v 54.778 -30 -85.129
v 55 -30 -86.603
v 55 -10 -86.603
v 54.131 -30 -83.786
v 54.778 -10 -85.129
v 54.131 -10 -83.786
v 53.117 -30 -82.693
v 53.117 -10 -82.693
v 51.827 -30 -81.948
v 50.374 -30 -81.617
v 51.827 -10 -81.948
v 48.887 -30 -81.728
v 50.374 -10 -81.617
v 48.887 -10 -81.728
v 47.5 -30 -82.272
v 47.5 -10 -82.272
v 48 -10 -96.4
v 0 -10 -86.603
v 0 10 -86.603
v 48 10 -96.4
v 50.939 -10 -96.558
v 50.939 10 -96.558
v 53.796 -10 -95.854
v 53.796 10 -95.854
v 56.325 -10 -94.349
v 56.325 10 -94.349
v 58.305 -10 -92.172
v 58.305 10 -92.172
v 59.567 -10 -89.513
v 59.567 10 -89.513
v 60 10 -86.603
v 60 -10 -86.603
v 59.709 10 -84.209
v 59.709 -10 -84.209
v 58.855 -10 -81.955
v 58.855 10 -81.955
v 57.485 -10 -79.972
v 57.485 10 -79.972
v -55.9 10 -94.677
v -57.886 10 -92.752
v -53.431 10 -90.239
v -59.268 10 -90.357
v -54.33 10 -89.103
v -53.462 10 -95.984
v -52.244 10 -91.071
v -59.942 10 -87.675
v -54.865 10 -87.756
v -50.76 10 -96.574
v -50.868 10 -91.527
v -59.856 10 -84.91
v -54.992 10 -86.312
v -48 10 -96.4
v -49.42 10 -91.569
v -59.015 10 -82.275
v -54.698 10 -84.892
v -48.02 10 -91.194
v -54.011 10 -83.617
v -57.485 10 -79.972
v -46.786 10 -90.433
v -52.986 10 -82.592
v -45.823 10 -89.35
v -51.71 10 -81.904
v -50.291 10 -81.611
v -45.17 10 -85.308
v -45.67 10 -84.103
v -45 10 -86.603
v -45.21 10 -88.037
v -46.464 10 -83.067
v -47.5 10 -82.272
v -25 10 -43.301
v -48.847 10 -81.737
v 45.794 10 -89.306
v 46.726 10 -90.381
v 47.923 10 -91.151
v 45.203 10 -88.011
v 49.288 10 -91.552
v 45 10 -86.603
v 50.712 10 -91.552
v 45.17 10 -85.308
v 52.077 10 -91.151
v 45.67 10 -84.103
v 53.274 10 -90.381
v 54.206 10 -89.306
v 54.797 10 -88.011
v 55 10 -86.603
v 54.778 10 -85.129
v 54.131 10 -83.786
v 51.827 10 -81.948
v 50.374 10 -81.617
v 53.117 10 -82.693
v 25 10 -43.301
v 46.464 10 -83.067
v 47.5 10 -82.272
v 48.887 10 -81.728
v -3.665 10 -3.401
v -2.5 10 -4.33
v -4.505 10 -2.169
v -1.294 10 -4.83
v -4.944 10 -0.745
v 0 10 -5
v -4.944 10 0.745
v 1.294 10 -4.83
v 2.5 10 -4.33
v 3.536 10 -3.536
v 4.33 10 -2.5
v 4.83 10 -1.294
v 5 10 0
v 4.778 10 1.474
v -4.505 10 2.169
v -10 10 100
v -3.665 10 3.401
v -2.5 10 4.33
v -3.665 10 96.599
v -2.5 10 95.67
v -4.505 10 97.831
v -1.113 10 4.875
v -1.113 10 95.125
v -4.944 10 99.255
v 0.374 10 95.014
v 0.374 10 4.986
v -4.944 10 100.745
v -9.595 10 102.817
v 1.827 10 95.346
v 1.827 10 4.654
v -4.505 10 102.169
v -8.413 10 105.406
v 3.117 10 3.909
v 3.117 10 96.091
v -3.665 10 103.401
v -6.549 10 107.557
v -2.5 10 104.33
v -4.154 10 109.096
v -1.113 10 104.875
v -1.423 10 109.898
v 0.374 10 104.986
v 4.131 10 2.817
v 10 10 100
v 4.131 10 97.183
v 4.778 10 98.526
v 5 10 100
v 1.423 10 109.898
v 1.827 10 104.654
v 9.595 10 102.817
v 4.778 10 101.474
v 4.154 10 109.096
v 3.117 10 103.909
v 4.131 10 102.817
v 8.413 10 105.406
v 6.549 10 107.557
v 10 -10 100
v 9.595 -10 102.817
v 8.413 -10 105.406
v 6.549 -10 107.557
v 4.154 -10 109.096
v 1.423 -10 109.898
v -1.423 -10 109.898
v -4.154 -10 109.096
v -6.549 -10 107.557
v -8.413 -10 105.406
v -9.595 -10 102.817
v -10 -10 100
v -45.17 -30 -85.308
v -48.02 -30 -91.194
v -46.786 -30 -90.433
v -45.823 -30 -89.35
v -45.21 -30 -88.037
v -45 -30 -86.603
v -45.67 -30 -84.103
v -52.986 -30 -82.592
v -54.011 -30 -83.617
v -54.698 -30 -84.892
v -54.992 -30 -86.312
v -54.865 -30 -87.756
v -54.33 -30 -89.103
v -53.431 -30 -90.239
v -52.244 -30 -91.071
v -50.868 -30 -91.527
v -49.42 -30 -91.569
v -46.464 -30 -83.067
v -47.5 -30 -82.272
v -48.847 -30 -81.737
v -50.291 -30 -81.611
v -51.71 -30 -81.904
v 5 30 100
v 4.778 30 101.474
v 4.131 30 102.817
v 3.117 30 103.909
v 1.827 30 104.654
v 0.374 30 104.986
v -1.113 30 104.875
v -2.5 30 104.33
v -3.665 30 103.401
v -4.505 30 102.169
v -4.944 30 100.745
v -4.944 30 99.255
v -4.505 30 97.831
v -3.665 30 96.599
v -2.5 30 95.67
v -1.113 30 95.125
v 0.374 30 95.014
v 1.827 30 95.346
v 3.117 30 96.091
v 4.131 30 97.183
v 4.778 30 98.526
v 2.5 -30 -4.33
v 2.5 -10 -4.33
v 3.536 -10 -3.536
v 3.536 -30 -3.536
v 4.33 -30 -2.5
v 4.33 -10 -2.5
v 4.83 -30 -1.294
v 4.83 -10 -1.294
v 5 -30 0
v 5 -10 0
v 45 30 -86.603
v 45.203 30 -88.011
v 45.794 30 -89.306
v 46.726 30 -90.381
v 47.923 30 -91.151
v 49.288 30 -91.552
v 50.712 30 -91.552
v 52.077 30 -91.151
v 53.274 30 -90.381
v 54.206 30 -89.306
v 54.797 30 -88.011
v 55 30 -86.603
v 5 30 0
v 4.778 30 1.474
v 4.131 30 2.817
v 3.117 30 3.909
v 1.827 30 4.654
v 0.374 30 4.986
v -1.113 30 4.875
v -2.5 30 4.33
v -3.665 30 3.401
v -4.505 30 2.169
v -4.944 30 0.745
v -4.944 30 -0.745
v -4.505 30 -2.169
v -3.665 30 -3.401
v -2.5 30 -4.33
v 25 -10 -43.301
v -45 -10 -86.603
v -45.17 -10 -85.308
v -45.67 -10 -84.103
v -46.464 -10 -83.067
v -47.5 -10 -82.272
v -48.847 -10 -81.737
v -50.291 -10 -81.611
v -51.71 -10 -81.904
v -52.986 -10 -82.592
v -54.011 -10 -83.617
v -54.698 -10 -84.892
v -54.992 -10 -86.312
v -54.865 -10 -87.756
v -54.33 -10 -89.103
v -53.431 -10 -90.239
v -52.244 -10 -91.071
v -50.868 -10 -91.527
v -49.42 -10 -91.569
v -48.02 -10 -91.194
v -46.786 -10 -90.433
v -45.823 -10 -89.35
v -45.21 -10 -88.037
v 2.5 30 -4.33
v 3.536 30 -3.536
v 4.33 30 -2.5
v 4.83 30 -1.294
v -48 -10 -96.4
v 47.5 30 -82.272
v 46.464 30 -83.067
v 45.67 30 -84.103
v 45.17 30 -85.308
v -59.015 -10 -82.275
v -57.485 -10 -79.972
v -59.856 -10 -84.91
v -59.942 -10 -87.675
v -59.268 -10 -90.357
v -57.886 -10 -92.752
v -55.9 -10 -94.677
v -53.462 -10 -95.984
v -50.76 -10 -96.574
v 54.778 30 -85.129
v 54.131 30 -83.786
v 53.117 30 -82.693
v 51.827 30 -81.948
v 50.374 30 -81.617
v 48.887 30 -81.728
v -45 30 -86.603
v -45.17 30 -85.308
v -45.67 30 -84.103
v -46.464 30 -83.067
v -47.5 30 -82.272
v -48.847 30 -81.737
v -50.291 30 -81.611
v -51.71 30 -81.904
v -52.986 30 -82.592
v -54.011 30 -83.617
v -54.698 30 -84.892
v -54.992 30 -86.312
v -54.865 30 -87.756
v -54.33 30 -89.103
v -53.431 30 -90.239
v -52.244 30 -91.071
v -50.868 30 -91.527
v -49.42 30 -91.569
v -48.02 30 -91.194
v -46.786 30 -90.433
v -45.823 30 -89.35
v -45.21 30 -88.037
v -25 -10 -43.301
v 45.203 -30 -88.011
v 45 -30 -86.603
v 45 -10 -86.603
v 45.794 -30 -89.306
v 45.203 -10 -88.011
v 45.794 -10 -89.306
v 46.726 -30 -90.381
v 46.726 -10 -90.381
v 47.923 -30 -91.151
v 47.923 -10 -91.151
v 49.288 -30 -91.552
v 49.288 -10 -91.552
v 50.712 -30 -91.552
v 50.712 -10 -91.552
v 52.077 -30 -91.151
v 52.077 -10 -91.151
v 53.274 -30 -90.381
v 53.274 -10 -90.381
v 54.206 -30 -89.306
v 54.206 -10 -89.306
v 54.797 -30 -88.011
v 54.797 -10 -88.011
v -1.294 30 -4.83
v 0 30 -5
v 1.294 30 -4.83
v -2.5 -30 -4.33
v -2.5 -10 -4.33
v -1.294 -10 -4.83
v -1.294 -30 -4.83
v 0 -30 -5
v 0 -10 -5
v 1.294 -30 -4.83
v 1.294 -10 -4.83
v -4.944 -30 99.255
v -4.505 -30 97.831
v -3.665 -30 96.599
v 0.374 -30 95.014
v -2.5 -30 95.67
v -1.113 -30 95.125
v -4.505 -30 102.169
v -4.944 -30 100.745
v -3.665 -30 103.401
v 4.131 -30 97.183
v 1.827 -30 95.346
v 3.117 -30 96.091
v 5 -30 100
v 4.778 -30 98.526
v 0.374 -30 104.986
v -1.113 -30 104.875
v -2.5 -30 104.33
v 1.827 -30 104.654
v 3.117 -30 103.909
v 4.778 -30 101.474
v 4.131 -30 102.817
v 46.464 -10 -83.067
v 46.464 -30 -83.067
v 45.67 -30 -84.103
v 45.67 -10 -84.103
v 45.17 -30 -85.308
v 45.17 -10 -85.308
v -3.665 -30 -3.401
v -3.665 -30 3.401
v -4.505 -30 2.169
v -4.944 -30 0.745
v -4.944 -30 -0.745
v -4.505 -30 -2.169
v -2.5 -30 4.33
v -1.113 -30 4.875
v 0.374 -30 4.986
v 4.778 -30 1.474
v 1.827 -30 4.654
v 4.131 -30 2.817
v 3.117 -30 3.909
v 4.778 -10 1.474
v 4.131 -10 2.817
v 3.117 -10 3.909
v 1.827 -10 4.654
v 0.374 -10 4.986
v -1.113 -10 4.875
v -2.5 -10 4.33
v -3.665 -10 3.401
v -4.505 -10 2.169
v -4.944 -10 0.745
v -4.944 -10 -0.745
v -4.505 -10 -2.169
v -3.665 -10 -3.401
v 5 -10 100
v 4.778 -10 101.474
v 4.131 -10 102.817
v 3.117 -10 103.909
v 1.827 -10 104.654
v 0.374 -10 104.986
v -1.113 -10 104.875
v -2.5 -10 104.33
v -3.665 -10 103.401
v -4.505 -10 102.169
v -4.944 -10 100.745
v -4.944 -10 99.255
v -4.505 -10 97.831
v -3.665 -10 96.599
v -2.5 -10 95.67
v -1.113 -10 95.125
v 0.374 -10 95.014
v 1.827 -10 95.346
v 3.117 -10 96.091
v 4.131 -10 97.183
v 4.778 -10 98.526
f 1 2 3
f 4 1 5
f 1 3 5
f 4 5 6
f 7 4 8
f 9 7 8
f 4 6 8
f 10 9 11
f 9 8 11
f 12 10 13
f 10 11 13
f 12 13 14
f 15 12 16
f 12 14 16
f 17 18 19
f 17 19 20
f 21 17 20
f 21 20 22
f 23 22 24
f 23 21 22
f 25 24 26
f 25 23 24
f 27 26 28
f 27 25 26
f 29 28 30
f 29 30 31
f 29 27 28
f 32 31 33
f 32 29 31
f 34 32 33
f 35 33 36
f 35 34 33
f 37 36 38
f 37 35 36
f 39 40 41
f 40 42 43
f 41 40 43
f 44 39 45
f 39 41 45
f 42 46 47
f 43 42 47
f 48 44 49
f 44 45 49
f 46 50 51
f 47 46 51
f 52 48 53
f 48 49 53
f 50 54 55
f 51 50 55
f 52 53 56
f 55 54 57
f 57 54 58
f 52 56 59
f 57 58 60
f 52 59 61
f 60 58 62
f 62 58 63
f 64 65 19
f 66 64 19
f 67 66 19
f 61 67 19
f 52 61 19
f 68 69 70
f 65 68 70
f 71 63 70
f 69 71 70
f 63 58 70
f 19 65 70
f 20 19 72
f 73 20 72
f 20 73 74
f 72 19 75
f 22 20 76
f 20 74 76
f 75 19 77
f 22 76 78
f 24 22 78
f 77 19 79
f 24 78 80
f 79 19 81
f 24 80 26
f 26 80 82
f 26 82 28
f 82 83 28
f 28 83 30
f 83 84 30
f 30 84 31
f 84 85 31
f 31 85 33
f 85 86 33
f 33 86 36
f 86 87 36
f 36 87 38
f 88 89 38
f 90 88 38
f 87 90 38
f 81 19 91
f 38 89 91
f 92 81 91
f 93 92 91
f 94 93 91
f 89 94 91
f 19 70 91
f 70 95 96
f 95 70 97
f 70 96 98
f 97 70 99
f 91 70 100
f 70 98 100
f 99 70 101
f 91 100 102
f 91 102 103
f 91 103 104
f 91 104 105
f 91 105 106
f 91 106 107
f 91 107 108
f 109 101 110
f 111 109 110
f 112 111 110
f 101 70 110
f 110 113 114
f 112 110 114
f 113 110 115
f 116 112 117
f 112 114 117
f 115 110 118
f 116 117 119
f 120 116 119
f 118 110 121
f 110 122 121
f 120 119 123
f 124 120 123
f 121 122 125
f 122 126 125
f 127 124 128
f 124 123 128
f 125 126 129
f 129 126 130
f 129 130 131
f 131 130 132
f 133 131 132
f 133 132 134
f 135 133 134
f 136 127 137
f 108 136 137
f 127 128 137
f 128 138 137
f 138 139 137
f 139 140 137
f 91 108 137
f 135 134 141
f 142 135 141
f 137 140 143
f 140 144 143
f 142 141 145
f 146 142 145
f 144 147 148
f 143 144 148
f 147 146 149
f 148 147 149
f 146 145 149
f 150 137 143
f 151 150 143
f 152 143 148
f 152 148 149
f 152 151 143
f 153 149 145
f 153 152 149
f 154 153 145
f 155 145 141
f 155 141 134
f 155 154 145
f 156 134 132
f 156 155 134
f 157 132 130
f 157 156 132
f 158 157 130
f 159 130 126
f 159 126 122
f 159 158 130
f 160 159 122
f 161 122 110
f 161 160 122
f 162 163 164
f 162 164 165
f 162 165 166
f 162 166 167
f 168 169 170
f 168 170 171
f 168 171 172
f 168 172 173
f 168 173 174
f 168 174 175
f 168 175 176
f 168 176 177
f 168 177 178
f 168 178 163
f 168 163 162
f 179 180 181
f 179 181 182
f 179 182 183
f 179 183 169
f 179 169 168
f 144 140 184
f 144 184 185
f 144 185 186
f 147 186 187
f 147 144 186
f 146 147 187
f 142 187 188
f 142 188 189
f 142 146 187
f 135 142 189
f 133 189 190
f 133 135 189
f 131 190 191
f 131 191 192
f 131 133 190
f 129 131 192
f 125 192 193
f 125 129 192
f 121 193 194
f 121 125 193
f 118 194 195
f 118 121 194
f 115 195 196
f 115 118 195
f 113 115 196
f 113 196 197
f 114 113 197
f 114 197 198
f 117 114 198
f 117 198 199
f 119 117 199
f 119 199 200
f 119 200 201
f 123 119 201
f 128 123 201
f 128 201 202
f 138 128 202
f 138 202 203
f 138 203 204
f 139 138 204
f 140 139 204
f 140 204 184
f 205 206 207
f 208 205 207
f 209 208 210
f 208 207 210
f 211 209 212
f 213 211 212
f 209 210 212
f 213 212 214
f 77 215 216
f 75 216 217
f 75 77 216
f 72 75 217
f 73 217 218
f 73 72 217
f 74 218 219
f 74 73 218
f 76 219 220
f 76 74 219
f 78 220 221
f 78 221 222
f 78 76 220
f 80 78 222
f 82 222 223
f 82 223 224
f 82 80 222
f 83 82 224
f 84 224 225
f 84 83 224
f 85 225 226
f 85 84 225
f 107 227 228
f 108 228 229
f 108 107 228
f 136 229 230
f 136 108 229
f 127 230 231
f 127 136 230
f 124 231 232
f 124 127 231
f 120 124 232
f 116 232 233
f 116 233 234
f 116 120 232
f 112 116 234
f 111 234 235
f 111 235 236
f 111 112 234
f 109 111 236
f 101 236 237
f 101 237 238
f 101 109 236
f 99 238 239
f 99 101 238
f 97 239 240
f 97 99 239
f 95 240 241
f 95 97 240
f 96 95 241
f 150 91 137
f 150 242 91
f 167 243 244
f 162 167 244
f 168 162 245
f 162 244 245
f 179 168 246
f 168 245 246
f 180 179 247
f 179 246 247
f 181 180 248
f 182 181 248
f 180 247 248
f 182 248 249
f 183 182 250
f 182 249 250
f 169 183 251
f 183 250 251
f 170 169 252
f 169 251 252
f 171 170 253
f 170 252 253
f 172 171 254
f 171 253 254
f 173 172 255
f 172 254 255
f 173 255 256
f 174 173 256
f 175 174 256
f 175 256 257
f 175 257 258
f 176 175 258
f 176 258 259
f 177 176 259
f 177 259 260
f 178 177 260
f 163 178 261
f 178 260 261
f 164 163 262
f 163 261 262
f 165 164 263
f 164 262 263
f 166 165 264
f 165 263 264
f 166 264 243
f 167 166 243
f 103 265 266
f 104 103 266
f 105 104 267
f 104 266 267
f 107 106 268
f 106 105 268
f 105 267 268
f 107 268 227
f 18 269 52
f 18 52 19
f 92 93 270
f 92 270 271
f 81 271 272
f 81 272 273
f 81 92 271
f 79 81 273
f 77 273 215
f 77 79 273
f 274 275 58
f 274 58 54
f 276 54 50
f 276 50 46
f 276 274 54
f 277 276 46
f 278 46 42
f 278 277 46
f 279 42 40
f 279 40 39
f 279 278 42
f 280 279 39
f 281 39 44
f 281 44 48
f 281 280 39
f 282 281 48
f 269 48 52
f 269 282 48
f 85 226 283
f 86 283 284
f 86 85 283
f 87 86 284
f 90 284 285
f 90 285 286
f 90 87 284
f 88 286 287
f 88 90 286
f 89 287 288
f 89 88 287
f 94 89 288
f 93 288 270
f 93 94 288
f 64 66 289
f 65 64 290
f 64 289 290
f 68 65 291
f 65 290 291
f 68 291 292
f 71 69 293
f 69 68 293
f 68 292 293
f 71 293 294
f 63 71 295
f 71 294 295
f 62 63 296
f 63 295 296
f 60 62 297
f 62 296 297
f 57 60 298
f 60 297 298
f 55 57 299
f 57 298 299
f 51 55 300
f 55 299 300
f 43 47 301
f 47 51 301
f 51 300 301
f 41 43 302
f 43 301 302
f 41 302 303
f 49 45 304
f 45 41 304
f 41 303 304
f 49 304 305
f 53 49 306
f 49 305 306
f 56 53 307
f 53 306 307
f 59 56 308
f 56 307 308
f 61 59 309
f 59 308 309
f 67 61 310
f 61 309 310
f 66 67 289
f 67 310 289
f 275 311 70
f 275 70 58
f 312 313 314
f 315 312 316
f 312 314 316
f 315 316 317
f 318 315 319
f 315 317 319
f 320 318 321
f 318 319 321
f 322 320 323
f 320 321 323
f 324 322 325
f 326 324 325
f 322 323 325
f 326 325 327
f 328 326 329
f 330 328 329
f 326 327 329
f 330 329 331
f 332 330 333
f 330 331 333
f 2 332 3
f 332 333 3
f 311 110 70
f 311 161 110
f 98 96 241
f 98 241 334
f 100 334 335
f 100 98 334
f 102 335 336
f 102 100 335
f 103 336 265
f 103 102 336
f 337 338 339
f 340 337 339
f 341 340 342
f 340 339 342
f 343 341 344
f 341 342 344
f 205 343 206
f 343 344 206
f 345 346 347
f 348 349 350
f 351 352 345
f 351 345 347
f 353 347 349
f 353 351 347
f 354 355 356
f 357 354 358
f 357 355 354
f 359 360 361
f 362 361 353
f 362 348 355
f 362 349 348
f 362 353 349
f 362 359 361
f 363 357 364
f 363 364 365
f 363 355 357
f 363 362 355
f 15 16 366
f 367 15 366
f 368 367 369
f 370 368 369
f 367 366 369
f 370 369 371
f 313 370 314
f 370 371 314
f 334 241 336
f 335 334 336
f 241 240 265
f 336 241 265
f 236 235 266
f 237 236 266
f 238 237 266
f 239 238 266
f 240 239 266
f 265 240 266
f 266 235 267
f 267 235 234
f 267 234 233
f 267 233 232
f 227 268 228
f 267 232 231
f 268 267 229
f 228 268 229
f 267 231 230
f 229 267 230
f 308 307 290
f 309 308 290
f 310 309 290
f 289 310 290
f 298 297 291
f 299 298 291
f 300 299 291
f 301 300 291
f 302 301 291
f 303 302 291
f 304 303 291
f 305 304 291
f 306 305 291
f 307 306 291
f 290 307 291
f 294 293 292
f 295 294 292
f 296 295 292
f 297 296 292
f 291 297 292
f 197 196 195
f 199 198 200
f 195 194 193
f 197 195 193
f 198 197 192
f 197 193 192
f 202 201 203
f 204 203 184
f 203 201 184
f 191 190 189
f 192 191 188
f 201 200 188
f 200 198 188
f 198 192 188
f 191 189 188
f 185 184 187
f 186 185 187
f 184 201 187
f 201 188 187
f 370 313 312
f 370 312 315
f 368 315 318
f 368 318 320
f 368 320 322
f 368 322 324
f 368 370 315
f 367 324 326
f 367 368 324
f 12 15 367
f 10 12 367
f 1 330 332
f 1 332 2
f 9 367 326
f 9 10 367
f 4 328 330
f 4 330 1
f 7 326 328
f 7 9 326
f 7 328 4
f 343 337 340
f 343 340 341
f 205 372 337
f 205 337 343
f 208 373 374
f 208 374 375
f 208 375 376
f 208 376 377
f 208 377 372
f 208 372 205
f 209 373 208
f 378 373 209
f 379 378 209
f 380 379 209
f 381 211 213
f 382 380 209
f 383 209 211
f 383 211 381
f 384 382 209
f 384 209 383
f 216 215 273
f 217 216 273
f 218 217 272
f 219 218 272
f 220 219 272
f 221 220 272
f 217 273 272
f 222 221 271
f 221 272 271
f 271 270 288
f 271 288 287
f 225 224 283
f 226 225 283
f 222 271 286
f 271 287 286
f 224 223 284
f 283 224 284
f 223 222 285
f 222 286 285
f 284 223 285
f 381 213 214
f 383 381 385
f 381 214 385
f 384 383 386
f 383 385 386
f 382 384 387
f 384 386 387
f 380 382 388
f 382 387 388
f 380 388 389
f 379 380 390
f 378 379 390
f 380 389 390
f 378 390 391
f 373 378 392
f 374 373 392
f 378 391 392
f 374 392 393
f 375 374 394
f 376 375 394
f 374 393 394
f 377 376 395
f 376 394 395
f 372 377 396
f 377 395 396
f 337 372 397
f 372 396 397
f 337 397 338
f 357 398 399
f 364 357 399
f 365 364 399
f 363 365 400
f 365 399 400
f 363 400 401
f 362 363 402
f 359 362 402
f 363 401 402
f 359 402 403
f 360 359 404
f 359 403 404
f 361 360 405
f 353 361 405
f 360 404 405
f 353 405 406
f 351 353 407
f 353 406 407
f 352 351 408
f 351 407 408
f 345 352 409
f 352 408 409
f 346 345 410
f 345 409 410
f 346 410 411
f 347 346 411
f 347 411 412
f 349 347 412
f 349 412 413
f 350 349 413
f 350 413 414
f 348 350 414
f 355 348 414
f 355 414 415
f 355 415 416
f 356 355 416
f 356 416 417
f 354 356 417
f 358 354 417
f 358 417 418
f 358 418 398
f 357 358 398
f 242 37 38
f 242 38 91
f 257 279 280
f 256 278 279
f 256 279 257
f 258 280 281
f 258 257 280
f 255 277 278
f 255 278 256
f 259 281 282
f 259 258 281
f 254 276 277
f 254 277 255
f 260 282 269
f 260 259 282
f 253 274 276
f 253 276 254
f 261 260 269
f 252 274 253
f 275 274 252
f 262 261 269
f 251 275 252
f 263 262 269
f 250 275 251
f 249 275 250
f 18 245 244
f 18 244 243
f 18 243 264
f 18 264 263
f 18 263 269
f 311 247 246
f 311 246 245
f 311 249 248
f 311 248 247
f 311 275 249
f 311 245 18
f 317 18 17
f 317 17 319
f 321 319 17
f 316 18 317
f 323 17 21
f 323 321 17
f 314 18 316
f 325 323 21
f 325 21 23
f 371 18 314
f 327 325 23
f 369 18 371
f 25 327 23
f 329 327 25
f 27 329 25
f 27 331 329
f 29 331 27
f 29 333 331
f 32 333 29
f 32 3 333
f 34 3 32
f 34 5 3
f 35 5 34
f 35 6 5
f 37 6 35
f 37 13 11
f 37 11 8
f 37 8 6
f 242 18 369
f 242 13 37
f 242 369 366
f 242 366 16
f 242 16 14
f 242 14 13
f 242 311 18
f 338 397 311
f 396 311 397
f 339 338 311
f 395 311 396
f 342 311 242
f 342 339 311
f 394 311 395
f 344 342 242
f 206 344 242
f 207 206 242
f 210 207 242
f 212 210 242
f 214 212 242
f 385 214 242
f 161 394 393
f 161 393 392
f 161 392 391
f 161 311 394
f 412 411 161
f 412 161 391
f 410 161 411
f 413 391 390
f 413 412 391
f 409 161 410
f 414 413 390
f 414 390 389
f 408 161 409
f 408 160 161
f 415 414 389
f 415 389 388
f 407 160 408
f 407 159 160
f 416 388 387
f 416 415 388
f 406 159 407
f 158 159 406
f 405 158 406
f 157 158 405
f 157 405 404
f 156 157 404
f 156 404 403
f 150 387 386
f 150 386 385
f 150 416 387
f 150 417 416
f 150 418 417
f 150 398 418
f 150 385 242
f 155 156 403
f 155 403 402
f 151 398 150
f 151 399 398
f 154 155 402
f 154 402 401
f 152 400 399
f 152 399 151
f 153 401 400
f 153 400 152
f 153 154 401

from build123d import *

# Parameters (mm, degrees)
F0_R     = 5
F1_DEPTH = 10
F2_DEPTH = 30


with BuildPart() as f1:
    # F0 (on Front) → F1 (new body, symmetric)
    with BuildSketch(Plane.XZ):
        with BuildLine():
            Line((-25, -43.3012701892), (-5, -8.6602540378))
            ThreePointArc((-5, -8.6602540378), (-5, 8.6602540378), (10, 0))
            ThreePointArc((10, 0), (8.6602540378, -5), (5, -8.6602540378))
            Line((5, -8.6602540378), (25, -43.3012701892))
            Line((25, -43.3012701892), (10, 100))
            ThreePointArc((10, 100), (0, 90), (-10, 100))
            Line((-10, 100), (-25, -43.3012701892))
        make_face()
        with BuildLine():
            Line((47.5, -82.2724133595), (45, -77.9422863406))
            ThreePointArc((45, -77.9422863406), (41.3397459622, -81.6025403784), (40, -86.6025403784))
            Line((40, -86.6025403784), (45, -86.6025403784))
            ThreePointArc((45, -86.6025403784), (45.6698729811, -84.1025403784), (47.5, -82.2724133595))
        make_face()
        with BuildLine():
            Line((-5, -8.6602540378), (-2.5, -4.3301270189))
            ThreePointArc((-2.5, -4.3301270189), (-2.5, 4.3301270189), (5, 0))
            ThreePointArc((5, 0), (4.3301270189, -2.5), (2.5, -4.3301270189))
            Line((2.5, -4.3301270189), (5, -8.6602540378))
            ThreePointArc((5, -8.6602540378), (8.6602540378, -5), (10, 0))
            ThreePointArc((10, 0), (-5, 8.6602540378), (-5, -8.6602540378))
        make_face()
        with BuildLine():
            Line((-45, -77.9422863406), (-25, -43.3012701892))
            Line((-25, -43.3012701892), (-57.4852813742, -79.9715100853))
            ThreePointArc((-57.4852813742, -79.9715100853), (-51.6042422288, -76.7320587858), (-45, -77.9422863406))
        make_face()
        with BuildLine():
            ThreePointArc((57.4852813742, -79.9715100853), (51.6042422288, -76.7320587858), (45, -77.9422863406))
            Line((45, -77.9422863406), (47.5, -82.2724133595))
            ThreePointArc((47.5, -82.2724133595), (52.5, -82.2724133595), (55, -86.6025403784))
            ThreePointArc((55, -86.6025403784), (50, -91.6025403784), (45, -86.6025403784))
            Line((45, -86.6025403784), (40, -86.6025403784))
            ThreePointArc((40, -86.6025403784), (42.2540333076, -92.9270956988), (48, -96.4004993496))
            ThreePointArc((48, -96.4004993496), (56.3245553203, -94.3485070709), (60, -86.6025403784))
            ThreePointArc((60, -86.6025403784), (59.3502089213, -83.0566141061), (57.4852813742, -79.9715100853))
        make_face()
        with BuildLine():
            ThreePointArc((-40, -86.6025403784), (-41.3397459622, -81.6025403784), (-45, -77.9422863406))
            Line((-45, -77.9422863406), (-47.5, -82.2724133595))
            ThreePointArc((-47.5, -82.2724133595), (-45.6698729811, -84.1025403784), (-45, -86.6025403784))
            Line((-45, -86.6025403784), (-40, -86.6025403784))
        make_face()
        with BuildLine():
            Line((0, -86.6025403784), (-40, -86.6025403784))
            ThreePointArc((-40, -86.6025403784), (-42.2540333076, -92.9270956988), (-48, -96.4004993496))
            Line((-48, -96.4004993496), (0, -86.6025403784))
        make_face()
        with BuildLine():
            ThreePointArc((48, -96.4004993496), (42.2540333076, -92.9270956988), (40, -86.6025403784))
            Line((40, -86.6025403784), (0, -86.6025403784))
            Line((0, -86.6025403784), (48, -96.4004993496))
        make_face()
        with BuildLine():
            Line((57.4852813742, -79.9715100853), (25, -43.3012701892))
            Line((25, -43.3012701892), (45, -77.9422863406))
            ThreePointArc((45, -77.9422863406), (51.6042422288, -76.7320587858), (57.4852813742, -79.9715100853))
        make_face()
        with BuildLine():
            ThreePointArc((10, 100), (0, 110), (-10, 100))
            ThreePointArc((-10, 100), (0, 90), (10, 100))
        make_face()
        with Locations((0, 100)):
            Circle(F0_R, mode=Mode.SUBTRACT)
        with BuildLine():
            Line((-47.5, -82.2724133595), (-45, -77.9422863406))
            ThreePointArc((-45, -77.9422863406), (-51.6042422288, -76.7320587858), (-57.4852813742, -79.9715100853))
            ThreePointArc((-57.4852813742, -79.9715100853), (-58.6602540378, -91.6025403784), (-48, -96.4004993496))
            ThreePointArc((-48, -96.4004993496), (-42.2540333076, -92.9270956988), (-40, -86.6025403784))
            Line((-40, -86.6025403784), (-45, -86.6025403784))
            ThreePointArc((-45, -86.6025403784), (-54.3301270189, -89.1025403784), (-47.5, -82.2724133595))
        make_face()
        with BuildLine():
            ThreePointArc((5, -8.6602540378), (0, -10), (-5, -8.6602540378))
            Line((-5, -8.6602540378), (-25, -43.3012701892))
            Line((-25, -43.3012701892), (-45, -77.9422863406))
            ThreePointArc((-45, -77.9422863406), (-41.3397459622, -81.6025403784), (-40, -86.6025403784))
            Line((-40, -86.6025403784), (0, -86.6025403784))
            Line((0, -86.6025403784), (40, -86.6025403784))
            ThreePointArc((40, -86.6025403784), (41.3397459622, -81.6025403784), (45, -77.9422863406))
            Line((45, -77.9422863406), (25, -43.3012701892))
            Line((25, -43.3012701892), (5, -8.6602540378))
        make_face()
        with BuildLine():
            ThreePointArc((2.5, -4.3301270189), (0, -5), (-2.5, -4.3301270189))
            Line((-2.5, -4.3301270189), (-5, -8.6602540378))
            ThreePointArc((-5, -8.6602540378), (0, -10), (5, -8.6602540378))
            Line((5, -8.6602540378), (2.5, -4.3301270189))
        make_face()
    extrude(amount=F1_DEPTH, both=True)

    # F0 (on Front) → F2 (join, symmetric)
    with BuildSketch(Plane.XZ):
        with Locations((0, 100)):
            Circle(F0_R)
        with BuildLine():
            Line((-2.5, -4.3301270189), (0, 0))
            Line((0, 0), (2.5, -4.3301270189))
            ThreePointArc((2.5, -4.3301270189), (4.3301270189, -2.5), (5, 0))
            ThreePointArc((5, 0), (-2.5, 4.3301270189), (-2.5, -4.3301270189))
        make_face()
        with BuildLine():
            Line((2.5, -4.3301270189), (0, 0))
            Line((0, 0), (-2.5, -4.3301270189))
            ThreePointArc((-2.5, -4.3301270189), (0, -5), (2.5, -4.3301270189))
        make_face()
        with BuildLine():
            ThreePointArc((-45, -86.6025403784), (-45.6698729811, -84.1025403784), (-47.5, -82.2724133595))
            Line((-47.5, -82.2724133595), (-50, -86.6025403784))
            Line((-50, -86.6025403784), (-45, -86.6025403784))
        make_face()
        with BuildLine():
            Line((-50, -86.6025403784), (-47.5, -82.2724133595))
            ThreePointArc((-47.5, -82.2724133595), (-54.3301270189, -89.1025403784), (-45, -86.6025403784))
            Line((-45, -86.6025403784), (-50, -86.6025403784))
        make_face()
        with BuildLine():
            Line((50, -86.6025403784), (47.5, -82.2724133595))
            ThreePointArc((47.5, -82.2724133595), (45.6698729811, -84.1025403784), (45, -86.6025403784))
            Line((45, -86.6025403784), (50, -86.6025403784))
        make_face()
        with BuildLine():
            ThreePointArc((55, -86.6025403784), (52.5, -82.2724133595), (47.5, -82.2724133595))
            Line((47.5, -82.2724133595), (50, -86.6025403784))
            Line((50, -86.6025403784), (45, -86.6025403784))
            ThreePointArc((45, -86.6025403784), (50, -91.6025403784), (55, -86.6025403784))
        make_face()
    extrude(amount=F2_DEPTH, both=True)


solid = f1.part
